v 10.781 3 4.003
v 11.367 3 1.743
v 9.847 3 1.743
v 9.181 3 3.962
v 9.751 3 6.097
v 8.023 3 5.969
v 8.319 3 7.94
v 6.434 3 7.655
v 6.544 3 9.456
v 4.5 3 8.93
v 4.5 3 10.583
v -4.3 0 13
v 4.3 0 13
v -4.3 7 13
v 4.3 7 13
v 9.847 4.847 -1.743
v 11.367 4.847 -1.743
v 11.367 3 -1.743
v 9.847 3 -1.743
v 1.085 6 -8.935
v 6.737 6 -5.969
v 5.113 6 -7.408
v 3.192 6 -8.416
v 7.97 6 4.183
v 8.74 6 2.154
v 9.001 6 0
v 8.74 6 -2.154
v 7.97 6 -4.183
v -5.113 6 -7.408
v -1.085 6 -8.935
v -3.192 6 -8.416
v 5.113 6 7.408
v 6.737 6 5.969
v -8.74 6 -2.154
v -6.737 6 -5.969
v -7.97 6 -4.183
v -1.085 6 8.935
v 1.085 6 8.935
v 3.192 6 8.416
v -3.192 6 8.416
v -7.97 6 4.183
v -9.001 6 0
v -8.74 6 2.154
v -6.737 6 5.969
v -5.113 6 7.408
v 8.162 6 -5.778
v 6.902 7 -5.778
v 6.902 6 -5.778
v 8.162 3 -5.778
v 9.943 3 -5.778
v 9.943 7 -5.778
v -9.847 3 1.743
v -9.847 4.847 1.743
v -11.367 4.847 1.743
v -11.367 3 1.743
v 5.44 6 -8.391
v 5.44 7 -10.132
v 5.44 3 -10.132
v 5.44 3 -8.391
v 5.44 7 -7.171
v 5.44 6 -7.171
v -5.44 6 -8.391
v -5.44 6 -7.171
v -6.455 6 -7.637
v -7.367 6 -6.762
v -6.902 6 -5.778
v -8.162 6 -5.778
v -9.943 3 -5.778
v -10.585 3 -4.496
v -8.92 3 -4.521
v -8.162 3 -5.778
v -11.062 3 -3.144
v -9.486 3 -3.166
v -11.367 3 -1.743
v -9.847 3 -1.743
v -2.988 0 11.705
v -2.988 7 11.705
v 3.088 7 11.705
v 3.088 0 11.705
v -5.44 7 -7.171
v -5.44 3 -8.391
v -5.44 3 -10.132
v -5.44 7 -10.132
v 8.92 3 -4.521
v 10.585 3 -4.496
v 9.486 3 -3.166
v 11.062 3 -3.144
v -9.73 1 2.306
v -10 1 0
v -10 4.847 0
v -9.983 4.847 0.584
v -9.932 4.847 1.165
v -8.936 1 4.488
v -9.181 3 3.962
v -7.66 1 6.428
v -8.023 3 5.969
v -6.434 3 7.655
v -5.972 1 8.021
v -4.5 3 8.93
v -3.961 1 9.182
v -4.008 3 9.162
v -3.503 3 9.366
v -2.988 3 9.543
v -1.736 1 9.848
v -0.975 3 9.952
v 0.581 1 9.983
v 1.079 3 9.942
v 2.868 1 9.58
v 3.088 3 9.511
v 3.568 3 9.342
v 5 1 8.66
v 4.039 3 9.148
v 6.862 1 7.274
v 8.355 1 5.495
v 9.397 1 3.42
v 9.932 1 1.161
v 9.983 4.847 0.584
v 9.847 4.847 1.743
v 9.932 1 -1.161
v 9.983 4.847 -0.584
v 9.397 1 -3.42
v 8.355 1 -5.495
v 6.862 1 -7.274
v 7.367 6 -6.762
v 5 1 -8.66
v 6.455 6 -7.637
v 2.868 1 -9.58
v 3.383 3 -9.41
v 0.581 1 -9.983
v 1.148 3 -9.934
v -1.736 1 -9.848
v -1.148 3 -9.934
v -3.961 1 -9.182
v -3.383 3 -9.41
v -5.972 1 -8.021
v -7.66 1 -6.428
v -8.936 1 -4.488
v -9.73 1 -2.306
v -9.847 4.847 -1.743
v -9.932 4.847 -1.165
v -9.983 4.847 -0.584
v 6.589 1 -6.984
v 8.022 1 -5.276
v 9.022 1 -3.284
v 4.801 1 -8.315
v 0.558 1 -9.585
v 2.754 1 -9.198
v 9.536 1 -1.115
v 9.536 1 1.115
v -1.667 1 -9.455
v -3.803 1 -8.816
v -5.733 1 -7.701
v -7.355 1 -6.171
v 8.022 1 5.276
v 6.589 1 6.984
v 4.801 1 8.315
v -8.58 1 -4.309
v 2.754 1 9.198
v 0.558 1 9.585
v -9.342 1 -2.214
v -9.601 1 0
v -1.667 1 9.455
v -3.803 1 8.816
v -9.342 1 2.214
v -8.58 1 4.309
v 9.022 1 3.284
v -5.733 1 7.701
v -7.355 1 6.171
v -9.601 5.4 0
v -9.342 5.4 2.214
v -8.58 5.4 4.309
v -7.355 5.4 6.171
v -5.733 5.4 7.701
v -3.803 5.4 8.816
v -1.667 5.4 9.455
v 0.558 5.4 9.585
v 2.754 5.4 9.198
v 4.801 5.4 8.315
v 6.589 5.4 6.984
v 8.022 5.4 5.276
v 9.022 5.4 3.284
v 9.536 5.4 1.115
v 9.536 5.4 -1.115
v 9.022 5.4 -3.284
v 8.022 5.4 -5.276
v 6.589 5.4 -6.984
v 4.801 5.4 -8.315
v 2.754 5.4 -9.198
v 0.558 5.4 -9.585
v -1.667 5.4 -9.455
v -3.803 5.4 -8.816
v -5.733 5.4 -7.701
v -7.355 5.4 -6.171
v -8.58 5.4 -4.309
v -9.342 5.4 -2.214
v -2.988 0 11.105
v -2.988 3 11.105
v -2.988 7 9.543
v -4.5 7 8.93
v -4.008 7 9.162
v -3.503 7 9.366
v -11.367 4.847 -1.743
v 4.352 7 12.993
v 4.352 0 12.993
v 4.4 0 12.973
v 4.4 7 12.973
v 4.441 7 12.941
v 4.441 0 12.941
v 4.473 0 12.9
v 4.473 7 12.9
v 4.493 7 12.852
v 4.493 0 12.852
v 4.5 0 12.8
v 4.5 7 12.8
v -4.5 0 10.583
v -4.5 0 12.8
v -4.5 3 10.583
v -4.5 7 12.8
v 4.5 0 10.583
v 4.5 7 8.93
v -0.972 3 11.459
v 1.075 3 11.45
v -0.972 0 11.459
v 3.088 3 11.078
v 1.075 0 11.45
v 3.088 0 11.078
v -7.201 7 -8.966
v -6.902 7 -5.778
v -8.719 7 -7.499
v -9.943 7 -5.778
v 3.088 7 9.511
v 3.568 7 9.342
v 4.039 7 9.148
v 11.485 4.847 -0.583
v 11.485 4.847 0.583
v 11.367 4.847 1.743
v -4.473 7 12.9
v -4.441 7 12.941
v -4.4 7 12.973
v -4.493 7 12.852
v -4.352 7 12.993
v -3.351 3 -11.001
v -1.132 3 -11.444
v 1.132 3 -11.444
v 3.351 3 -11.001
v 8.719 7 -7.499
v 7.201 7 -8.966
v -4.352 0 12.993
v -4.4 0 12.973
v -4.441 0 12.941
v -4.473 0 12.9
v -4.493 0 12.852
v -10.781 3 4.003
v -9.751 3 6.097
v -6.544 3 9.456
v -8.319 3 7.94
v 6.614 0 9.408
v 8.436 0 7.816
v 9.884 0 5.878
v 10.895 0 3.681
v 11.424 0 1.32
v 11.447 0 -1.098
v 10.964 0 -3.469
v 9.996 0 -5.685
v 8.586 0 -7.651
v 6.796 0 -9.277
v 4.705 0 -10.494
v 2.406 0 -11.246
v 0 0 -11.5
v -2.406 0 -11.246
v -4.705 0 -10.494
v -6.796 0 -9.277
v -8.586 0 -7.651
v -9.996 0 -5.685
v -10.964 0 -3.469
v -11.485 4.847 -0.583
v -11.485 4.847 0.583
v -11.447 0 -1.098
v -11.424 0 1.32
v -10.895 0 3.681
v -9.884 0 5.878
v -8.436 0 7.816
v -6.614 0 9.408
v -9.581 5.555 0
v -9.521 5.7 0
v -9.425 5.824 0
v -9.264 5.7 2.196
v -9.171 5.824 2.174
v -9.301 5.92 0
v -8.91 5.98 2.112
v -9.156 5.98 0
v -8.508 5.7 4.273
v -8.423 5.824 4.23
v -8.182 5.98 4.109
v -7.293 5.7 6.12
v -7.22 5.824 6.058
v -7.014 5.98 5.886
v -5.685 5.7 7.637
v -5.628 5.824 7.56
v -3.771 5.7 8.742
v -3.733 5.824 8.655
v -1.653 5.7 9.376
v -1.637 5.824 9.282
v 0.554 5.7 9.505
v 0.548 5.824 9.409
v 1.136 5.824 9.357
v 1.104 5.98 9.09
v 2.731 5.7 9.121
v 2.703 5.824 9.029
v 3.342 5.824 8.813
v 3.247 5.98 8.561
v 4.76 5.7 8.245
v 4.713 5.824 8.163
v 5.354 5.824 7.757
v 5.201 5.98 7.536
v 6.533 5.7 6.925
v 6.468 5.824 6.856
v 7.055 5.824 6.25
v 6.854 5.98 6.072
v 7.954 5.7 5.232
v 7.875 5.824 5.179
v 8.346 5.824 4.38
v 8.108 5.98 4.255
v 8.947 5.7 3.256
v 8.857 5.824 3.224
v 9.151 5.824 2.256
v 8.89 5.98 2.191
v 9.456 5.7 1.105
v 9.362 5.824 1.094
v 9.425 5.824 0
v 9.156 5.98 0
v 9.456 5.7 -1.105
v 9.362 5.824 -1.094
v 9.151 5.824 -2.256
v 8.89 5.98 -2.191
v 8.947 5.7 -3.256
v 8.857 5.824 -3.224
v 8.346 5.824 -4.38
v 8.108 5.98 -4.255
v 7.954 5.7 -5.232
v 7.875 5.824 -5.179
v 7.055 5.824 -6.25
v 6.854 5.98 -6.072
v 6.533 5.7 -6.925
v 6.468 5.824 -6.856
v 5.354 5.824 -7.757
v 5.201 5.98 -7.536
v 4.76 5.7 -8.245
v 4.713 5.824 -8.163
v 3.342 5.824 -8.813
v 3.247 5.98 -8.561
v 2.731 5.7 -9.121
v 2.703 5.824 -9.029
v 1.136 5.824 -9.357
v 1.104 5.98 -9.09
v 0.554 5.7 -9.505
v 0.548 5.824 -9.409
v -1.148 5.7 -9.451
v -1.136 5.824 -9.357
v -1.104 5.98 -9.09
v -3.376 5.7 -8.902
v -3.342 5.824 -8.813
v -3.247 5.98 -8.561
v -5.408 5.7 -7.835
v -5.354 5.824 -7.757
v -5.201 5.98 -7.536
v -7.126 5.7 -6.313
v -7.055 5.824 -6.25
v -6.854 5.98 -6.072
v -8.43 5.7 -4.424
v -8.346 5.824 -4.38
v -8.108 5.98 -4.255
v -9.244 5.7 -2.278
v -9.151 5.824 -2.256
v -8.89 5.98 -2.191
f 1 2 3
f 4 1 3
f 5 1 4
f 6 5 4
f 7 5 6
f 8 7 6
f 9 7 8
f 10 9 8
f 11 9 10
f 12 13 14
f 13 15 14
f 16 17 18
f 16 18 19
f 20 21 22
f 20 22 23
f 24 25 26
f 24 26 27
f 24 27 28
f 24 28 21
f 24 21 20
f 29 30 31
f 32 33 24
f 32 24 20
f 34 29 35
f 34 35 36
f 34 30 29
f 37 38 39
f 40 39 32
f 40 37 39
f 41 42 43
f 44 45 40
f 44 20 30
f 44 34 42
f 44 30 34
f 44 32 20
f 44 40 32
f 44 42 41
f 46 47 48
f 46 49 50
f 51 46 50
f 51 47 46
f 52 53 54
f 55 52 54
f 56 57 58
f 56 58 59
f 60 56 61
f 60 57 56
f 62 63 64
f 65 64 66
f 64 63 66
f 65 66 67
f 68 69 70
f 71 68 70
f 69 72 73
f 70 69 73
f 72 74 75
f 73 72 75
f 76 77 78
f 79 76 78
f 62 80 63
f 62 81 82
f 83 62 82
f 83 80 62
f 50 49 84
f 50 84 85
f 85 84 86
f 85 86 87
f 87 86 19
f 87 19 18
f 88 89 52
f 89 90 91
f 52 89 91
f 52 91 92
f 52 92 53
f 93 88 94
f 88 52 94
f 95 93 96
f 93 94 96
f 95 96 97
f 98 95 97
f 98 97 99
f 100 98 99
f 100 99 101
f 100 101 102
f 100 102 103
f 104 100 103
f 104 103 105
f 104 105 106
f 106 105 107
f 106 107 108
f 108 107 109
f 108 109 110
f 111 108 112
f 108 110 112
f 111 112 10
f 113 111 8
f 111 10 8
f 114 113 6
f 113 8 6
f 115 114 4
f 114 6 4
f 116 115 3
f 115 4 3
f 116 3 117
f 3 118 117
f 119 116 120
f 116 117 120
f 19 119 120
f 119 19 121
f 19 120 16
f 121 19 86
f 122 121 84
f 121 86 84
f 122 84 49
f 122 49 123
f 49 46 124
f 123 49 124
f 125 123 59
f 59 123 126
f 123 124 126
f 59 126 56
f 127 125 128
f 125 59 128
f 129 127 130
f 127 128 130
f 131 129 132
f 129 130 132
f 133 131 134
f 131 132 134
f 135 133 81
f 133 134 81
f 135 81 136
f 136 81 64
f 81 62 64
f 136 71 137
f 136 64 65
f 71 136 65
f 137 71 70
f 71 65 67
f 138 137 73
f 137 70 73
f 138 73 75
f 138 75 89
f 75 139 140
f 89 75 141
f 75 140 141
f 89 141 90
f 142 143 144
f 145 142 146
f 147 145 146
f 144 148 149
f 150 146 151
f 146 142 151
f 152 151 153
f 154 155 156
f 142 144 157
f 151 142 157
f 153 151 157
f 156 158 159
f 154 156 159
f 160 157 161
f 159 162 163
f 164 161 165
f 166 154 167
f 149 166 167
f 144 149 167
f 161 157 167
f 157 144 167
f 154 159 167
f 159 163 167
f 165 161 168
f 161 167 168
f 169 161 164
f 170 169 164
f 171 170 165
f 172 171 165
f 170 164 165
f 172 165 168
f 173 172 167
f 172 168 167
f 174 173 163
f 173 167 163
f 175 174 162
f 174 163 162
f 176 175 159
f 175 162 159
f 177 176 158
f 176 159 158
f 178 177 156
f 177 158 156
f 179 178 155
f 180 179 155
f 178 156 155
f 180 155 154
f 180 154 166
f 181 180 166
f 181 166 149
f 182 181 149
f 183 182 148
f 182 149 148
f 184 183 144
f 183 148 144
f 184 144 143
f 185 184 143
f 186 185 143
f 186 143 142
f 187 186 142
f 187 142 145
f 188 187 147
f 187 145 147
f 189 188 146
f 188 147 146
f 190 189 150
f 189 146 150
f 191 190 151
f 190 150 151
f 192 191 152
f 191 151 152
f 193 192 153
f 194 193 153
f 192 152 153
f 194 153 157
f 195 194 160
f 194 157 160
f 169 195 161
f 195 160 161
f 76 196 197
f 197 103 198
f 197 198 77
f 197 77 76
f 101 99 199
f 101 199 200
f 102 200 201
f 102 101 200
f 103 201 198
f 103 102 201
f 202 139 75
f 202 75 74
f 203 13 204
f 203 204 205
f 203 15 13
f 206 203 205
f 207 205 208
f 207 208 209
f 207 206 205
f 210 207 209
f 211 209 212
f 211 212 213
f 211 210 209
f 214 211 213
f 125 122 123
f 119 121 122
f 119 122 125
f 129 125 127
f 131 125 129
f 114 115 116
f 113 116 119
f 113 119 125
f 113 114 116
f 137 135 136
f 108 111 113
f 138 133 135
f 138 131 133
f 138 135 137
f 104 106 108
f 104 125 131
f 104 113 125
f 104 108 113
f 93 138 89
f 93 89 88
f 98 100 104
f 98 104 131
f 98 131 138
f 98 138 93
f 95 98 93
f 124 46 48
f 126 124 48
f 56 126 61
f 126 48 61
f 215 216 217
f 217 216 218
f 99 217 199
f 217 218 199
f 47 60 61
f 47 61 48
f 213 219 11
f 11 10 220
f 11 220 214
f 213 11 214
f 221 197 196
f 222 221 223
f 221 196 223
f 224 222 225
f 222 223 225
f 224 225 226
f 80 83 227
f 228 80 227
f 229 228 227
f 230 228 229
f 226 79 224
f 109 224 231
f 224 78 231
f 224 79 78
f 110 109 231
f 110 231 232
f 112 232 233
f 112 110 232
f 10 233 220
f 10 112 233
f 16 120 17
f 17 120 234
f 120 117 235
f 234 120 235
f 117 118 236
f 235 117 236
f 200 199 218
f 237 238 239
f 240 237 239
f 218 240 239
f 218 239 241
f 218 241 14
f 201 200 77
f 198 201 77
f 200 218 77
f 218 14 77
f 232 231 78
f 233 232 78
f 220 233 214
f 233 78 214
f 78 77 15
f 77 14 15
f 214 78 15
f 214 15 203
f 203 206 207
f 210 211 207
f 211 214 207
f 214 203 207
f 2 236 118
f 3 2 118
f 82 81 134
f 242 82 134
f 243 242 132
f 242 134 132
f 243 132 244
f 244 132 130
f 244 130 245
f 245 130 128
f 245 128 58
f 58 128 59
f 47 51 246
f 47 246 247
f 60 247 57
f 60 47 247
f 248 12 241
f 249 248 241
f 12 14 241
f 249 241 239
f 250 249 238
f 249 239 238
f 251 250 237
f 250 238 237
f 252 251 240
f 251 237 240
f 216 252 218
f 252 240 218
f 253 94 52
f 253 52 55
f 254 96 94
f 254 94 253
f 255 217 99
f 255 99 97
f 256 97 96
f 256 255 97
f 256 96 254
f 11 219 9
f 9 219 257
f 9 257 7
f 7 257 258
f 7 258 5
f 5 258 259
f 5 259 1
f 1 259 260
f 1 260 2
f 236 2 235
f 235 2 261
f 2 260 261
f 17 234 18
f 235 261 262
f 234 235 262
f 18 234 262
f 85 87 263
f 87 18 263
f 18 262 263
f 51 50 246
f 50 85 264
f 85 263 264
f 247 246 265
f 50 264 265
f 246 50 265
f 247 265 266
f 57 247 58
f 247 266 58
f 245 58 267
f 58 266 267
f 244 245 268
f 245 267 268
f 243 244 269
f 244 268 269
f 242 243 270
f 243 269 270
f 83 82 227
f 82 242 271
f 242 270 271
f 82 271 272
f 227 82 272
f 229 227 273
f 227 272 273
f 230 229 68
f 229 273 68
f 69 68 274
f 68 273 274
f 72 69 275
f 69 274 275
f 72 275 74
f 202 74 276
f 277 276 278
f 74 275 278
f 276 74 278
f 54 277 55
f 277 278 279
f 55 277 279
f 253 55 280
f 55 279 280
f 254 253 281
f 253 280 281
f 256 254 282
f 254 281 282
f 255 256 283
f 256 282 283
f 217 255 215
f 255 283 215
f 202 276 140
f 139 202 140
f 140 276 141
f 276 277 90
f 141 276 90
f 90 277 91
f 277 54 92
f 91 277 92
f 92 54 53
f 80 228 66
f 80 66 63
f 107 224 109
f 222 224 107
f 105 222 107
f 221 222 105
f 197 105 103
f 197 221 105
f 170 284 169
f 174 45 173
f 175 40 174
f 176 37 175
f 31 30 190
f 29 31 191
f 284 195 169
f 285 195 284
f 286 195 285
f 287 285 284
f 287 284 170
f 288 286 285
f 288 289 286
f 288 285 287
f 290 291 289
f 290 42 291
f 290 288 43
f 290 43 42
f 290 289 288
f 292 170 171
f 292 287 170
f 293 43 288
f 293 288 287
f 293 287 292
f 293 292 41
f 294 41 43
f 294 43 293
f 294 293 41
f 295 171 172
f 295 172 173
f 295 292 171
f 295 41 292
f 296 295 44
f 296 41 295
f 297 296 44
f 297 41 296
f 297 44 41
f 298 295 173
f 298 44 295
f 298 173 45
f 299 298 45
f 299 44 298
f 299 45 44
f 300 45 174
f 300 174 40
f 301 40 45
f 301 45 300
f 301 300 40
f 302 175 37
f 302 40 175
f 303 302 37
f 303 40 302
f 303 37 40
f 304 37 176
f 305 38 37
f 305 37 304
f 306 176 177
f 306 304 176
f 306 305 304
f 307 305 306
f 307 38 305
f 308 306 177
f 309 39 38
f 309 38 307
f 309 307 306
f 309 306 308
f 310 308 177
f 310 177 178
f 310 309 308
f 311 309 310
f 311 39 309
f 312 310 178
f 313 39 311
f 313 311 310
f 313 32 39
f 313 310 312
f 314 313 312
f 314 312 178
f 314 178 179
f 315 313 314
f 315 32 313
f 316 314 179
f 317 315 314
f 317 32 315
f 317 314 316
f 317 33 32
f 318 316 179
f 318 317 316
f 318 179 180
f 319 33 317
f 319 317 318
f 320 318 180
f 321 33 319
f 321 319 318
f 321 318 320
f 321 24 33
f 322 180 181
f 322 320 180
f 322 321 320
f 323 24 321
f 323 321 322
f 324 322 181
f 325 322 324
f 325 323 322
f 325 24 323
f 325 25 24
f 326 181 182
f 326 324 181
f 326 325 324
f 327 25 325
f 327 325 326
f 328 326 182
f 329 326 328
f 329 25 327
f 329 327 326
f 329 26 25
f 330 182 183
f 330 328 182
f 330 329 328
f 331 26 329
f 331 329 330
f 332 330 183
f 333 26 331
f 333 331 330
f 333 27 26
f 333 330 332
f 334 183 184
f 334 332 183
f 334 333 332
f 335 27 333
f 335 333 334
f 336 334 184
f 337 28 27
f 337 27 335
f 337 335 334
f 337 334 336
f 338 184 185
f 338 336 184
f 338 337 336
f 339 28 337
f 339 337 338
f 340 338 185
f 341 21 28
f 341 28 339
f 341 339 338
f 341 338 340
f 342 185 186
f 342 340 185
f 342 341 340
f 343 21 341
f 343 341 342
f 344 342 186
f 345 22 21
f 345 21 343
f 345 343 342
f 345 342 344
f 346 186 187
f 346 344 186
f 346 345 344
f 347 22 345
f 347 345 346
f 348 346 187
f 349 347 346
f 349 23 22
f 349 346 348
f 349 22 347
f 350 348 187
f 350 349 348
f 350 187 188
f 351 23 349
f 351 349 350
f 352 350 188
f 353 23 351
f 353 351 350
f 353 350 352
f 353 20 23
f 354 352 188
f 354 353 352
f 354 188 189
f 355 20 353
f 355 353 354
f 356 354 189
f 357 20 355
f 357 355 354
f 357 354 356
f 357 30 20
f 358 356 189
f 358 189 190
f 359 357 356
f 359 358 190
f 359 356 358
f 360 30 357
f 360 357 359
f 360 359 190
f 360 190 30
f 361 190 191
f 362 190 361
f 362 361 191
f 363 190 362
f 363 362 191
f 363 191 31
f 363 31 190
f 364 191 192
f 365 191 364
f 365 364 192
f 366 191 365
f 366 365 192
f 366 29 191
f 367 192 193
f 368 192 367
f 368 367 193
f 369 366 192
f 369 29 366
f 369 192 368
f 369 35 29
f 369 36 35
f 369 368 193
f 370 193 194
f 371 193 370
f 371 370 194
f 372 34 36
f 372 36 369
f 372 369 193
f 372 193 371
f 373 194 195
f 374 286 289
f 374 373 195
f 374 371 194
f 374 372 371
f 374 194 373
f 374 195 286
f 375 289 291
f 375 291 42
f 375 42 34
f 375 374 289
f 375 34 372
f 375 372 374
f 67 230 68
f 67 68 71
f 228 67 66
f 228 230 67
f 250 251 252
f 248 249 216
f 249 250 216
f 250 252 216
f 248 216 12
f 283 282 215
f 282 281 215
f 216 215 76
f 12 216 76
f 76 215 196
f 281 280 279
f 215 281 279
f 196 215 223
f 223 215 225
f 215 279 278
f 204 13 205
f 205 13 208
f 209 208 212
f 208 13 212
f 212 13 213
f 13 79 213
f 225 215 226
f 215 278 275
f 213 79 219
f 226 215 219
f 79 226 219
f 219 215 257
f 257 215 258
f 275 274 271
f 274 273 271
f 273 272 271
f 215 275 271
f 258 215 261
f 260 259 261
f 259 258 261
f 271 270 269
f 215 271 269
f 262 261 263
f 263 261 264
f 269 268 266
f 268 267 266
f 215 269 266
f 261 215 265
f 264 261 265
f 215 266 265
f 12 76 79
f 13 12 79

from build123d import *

# Parameters (mm, degrees)
CROQUIS1_R            = 11.5
EXTRUIR1_DEPTH        = 7
CROQUIS2_R            = 10
CORTAR_EXTRUIR1_DEPTH = 6
CROQUIS3_W            = 24.654500354
CROQUIS3_H            = 10.907748641
CORTAR_EXTRUIR2_DEPTH = 4
CROQUIS4_W            = 23.977576975
CROQUIS4_H            = 2.848058902
CORTAR_EXTRUIR3_DEPTH = 4
EXTRUIR2_DEPTH        = 4
EXTRUIR2_DEPTH_BACK   = 3
REDONDEO1_R           = 0.2
CROQUIS6_R            = 9.601083159
EXTRUIR3_DEPTH        = 5
REDONDEO2_R           = 0.6
EXTRUIR5_DEPTH        = 1
EXTRUIR5_2_DEPTH      = 1


with BuildPart() as part:
    # Croquis1 → Extruir1 (new body)
    with BuildSketch(Plane(origin=(0, 0, 0), x_dir=(1, 0, 0), z_dir=(0, 1, 0))):
        Circle(CROQUIS1_R)
    extrude(amount=EXTRUIR1_DEPTH)

    # Croquis2 → Cortar-Extruir1 (cut)
    with BuildSketch(Plane(origin=(0, 7, 0), x_dir=(-1, 0, 0), z_dir=(0, 1, 0))):
        Circle(CROQUIS2_R)
    extrude(amount=-CORTAR_EXTRUIR1_DEPTH, mode=Mode.SUBTRACT)

    # Croquis3 → Cortar-Extruir2 (cut)
    with BuildSketch(Plane(origin=(0, 7, 0), x_dir=(-1, 0, 0), z_dir=(0, 1, 0))):
        Polygon((-12.053311284, -1.7432475), (12.60118907, -1.7432475), (12.60118907, -5.778118356), (5.440306875, -5.778118356), (5.440306875, -12.650996141), (-5.440306875, -12.650996141), (-5.440306875, -5.778118356), (-12.053311284, -5.778118356), align=None)
        with Locations((0.273938893, 7.197121821)):
            Rectangle(CROQUIS3_W, CROQUIS3_H)
    extrude(amount=-CORTAR_EXTRUIR2_DEPTH, mode=Mode.SUBTRACT)

    # Croquis4 → Cortar-Extruir3 (cut)
    with BuildSketch(Plane.XY.offset(1.7432475)):
        with Locations((0.057730923, 6.271084337)):
            Rectangle(CROQUIS4_W, CROQUIS4_H)
    extrude(amount=-CORTAR_EXTRUIR3_DEPTH, mode=Mode.SUBTRACT)

    # Croquis5 → Extruir2 (add, two sides)
    with BuildSketch(Plane(origin=(0, 3, 0), x_dir=(-1, 0, 0), z_dir=(0, 1, 0))) as extruir2_sk:
        with BuildLine():
            Line((-4.5, 8.93028555), (-4.5, 13))
            Line((-4.5, 13), (4.5, 13))
            Line((4.5, 13), (4.5, 8.93028555))
            ThreePointArc((4.5, 8.93028555), (3.756725553, 9.267524649), (2.988424285, 9.543024693))
            Line((2.988424285, 9.543024693), (2.988424285, 11.704661784))
            Line((2.988424285, 11.704661784), (-3.088038428, 11.704661784))
            Line((-3.088038428, 11.704661784), (-3.088038428, 9.51125747))
            ThreePointArc((-3.088038428, 9.51125747), (-3.805123374, 9.247758437), (-4.5, 8.93028555))
        make_face()
    extrude(amount=EXTRUIR2_DEPTH)
    extrude(extruir2_sk.sketch, amount=-EXTRUIR2_DEPTH_BACK)

    # Redondeo1
    redondeo1_edges = [part.edges().sort_by_distance(p)[0] for p in [
        (4.5, 3.5, 13),
        (-4.5, 3.5, 13),
    ]]
    fillet(redondeo1_edges, radius=REDONDEO1_R)


with BuildPart() as body_2:
    # Croquis6 → Extruir3 (new body)
    with BuildSketch(Plane(origin=(0, 1, 0), x_dir=(-1, 0, 0), z_dir=(0, 1, 0))):
        Circle(CROQUIS6_R)
    extrude(amount=EXTRUIR3_DEPTH)

    # Redondeo2
    redondeo2_edges = [body_2.edges().sort_by_distance(p)[0] for p in [
        (9.601083159, 6, 0),
    ]]
    fillet(redondeo2_edges, radius=REDONDEO2_R)


with BuildPart() as body_3:
    # Croquis7 → Extruir5 (new body)
    with BuildSketch(Plane(origin=(0, 7, 0), x_dir=(-1, 0, 0), z_dir=(0, 1, 0))):
        with BuildLine():
            Line((-5.440306875, -8.390653199), (-5.440306875, -7.170952457))
            Line((-5.440306875, -7.170952457), (-6.90165533, -5.778118356))
            Line((-6.90165533, -5.778118356), (-8.161700084, -5.778118356))
            ThreePointArc((-8.161700084, -5.778118356), (-6.925314643, -7.213876704), (-5.440306875, -8.390653199))
        make_face()
    extrude(amount=-EXTRUIR5_DEPTH)


with BuildPart() as body_4:
    # Croquis7 → Extruir5 2 (new body)
    with BuildSketch(Plane(origin=(0, 7, 0), x_dir=(-1, 0, 0), z_dir=(0, 1, 0))):
        with BuildLine():
            Line((6.90165533, -5.778118356), (5.440306875, -7.170952457))
            Line((5.440306875, -7.170952457), (5.440306875, -8.390653199))
            ThreePointArc((5.440306875, -8.390653199), (6.925314643, -7.213876704), (8.161700084, -5.778118356))
            Line((8.161700084, -5.778118356), (6.90165533, -5.778118356))
        make_face()
    extrude(amount=-EXTRUIR5_2_DEPTH)


with BuildPart() as part_1:
    add(part.part)

    # Combinar1: union body 4, body 3
    add(body_4.part)
    add(body_3.part)


solid = Compound([body_2.part, part_1.part])
